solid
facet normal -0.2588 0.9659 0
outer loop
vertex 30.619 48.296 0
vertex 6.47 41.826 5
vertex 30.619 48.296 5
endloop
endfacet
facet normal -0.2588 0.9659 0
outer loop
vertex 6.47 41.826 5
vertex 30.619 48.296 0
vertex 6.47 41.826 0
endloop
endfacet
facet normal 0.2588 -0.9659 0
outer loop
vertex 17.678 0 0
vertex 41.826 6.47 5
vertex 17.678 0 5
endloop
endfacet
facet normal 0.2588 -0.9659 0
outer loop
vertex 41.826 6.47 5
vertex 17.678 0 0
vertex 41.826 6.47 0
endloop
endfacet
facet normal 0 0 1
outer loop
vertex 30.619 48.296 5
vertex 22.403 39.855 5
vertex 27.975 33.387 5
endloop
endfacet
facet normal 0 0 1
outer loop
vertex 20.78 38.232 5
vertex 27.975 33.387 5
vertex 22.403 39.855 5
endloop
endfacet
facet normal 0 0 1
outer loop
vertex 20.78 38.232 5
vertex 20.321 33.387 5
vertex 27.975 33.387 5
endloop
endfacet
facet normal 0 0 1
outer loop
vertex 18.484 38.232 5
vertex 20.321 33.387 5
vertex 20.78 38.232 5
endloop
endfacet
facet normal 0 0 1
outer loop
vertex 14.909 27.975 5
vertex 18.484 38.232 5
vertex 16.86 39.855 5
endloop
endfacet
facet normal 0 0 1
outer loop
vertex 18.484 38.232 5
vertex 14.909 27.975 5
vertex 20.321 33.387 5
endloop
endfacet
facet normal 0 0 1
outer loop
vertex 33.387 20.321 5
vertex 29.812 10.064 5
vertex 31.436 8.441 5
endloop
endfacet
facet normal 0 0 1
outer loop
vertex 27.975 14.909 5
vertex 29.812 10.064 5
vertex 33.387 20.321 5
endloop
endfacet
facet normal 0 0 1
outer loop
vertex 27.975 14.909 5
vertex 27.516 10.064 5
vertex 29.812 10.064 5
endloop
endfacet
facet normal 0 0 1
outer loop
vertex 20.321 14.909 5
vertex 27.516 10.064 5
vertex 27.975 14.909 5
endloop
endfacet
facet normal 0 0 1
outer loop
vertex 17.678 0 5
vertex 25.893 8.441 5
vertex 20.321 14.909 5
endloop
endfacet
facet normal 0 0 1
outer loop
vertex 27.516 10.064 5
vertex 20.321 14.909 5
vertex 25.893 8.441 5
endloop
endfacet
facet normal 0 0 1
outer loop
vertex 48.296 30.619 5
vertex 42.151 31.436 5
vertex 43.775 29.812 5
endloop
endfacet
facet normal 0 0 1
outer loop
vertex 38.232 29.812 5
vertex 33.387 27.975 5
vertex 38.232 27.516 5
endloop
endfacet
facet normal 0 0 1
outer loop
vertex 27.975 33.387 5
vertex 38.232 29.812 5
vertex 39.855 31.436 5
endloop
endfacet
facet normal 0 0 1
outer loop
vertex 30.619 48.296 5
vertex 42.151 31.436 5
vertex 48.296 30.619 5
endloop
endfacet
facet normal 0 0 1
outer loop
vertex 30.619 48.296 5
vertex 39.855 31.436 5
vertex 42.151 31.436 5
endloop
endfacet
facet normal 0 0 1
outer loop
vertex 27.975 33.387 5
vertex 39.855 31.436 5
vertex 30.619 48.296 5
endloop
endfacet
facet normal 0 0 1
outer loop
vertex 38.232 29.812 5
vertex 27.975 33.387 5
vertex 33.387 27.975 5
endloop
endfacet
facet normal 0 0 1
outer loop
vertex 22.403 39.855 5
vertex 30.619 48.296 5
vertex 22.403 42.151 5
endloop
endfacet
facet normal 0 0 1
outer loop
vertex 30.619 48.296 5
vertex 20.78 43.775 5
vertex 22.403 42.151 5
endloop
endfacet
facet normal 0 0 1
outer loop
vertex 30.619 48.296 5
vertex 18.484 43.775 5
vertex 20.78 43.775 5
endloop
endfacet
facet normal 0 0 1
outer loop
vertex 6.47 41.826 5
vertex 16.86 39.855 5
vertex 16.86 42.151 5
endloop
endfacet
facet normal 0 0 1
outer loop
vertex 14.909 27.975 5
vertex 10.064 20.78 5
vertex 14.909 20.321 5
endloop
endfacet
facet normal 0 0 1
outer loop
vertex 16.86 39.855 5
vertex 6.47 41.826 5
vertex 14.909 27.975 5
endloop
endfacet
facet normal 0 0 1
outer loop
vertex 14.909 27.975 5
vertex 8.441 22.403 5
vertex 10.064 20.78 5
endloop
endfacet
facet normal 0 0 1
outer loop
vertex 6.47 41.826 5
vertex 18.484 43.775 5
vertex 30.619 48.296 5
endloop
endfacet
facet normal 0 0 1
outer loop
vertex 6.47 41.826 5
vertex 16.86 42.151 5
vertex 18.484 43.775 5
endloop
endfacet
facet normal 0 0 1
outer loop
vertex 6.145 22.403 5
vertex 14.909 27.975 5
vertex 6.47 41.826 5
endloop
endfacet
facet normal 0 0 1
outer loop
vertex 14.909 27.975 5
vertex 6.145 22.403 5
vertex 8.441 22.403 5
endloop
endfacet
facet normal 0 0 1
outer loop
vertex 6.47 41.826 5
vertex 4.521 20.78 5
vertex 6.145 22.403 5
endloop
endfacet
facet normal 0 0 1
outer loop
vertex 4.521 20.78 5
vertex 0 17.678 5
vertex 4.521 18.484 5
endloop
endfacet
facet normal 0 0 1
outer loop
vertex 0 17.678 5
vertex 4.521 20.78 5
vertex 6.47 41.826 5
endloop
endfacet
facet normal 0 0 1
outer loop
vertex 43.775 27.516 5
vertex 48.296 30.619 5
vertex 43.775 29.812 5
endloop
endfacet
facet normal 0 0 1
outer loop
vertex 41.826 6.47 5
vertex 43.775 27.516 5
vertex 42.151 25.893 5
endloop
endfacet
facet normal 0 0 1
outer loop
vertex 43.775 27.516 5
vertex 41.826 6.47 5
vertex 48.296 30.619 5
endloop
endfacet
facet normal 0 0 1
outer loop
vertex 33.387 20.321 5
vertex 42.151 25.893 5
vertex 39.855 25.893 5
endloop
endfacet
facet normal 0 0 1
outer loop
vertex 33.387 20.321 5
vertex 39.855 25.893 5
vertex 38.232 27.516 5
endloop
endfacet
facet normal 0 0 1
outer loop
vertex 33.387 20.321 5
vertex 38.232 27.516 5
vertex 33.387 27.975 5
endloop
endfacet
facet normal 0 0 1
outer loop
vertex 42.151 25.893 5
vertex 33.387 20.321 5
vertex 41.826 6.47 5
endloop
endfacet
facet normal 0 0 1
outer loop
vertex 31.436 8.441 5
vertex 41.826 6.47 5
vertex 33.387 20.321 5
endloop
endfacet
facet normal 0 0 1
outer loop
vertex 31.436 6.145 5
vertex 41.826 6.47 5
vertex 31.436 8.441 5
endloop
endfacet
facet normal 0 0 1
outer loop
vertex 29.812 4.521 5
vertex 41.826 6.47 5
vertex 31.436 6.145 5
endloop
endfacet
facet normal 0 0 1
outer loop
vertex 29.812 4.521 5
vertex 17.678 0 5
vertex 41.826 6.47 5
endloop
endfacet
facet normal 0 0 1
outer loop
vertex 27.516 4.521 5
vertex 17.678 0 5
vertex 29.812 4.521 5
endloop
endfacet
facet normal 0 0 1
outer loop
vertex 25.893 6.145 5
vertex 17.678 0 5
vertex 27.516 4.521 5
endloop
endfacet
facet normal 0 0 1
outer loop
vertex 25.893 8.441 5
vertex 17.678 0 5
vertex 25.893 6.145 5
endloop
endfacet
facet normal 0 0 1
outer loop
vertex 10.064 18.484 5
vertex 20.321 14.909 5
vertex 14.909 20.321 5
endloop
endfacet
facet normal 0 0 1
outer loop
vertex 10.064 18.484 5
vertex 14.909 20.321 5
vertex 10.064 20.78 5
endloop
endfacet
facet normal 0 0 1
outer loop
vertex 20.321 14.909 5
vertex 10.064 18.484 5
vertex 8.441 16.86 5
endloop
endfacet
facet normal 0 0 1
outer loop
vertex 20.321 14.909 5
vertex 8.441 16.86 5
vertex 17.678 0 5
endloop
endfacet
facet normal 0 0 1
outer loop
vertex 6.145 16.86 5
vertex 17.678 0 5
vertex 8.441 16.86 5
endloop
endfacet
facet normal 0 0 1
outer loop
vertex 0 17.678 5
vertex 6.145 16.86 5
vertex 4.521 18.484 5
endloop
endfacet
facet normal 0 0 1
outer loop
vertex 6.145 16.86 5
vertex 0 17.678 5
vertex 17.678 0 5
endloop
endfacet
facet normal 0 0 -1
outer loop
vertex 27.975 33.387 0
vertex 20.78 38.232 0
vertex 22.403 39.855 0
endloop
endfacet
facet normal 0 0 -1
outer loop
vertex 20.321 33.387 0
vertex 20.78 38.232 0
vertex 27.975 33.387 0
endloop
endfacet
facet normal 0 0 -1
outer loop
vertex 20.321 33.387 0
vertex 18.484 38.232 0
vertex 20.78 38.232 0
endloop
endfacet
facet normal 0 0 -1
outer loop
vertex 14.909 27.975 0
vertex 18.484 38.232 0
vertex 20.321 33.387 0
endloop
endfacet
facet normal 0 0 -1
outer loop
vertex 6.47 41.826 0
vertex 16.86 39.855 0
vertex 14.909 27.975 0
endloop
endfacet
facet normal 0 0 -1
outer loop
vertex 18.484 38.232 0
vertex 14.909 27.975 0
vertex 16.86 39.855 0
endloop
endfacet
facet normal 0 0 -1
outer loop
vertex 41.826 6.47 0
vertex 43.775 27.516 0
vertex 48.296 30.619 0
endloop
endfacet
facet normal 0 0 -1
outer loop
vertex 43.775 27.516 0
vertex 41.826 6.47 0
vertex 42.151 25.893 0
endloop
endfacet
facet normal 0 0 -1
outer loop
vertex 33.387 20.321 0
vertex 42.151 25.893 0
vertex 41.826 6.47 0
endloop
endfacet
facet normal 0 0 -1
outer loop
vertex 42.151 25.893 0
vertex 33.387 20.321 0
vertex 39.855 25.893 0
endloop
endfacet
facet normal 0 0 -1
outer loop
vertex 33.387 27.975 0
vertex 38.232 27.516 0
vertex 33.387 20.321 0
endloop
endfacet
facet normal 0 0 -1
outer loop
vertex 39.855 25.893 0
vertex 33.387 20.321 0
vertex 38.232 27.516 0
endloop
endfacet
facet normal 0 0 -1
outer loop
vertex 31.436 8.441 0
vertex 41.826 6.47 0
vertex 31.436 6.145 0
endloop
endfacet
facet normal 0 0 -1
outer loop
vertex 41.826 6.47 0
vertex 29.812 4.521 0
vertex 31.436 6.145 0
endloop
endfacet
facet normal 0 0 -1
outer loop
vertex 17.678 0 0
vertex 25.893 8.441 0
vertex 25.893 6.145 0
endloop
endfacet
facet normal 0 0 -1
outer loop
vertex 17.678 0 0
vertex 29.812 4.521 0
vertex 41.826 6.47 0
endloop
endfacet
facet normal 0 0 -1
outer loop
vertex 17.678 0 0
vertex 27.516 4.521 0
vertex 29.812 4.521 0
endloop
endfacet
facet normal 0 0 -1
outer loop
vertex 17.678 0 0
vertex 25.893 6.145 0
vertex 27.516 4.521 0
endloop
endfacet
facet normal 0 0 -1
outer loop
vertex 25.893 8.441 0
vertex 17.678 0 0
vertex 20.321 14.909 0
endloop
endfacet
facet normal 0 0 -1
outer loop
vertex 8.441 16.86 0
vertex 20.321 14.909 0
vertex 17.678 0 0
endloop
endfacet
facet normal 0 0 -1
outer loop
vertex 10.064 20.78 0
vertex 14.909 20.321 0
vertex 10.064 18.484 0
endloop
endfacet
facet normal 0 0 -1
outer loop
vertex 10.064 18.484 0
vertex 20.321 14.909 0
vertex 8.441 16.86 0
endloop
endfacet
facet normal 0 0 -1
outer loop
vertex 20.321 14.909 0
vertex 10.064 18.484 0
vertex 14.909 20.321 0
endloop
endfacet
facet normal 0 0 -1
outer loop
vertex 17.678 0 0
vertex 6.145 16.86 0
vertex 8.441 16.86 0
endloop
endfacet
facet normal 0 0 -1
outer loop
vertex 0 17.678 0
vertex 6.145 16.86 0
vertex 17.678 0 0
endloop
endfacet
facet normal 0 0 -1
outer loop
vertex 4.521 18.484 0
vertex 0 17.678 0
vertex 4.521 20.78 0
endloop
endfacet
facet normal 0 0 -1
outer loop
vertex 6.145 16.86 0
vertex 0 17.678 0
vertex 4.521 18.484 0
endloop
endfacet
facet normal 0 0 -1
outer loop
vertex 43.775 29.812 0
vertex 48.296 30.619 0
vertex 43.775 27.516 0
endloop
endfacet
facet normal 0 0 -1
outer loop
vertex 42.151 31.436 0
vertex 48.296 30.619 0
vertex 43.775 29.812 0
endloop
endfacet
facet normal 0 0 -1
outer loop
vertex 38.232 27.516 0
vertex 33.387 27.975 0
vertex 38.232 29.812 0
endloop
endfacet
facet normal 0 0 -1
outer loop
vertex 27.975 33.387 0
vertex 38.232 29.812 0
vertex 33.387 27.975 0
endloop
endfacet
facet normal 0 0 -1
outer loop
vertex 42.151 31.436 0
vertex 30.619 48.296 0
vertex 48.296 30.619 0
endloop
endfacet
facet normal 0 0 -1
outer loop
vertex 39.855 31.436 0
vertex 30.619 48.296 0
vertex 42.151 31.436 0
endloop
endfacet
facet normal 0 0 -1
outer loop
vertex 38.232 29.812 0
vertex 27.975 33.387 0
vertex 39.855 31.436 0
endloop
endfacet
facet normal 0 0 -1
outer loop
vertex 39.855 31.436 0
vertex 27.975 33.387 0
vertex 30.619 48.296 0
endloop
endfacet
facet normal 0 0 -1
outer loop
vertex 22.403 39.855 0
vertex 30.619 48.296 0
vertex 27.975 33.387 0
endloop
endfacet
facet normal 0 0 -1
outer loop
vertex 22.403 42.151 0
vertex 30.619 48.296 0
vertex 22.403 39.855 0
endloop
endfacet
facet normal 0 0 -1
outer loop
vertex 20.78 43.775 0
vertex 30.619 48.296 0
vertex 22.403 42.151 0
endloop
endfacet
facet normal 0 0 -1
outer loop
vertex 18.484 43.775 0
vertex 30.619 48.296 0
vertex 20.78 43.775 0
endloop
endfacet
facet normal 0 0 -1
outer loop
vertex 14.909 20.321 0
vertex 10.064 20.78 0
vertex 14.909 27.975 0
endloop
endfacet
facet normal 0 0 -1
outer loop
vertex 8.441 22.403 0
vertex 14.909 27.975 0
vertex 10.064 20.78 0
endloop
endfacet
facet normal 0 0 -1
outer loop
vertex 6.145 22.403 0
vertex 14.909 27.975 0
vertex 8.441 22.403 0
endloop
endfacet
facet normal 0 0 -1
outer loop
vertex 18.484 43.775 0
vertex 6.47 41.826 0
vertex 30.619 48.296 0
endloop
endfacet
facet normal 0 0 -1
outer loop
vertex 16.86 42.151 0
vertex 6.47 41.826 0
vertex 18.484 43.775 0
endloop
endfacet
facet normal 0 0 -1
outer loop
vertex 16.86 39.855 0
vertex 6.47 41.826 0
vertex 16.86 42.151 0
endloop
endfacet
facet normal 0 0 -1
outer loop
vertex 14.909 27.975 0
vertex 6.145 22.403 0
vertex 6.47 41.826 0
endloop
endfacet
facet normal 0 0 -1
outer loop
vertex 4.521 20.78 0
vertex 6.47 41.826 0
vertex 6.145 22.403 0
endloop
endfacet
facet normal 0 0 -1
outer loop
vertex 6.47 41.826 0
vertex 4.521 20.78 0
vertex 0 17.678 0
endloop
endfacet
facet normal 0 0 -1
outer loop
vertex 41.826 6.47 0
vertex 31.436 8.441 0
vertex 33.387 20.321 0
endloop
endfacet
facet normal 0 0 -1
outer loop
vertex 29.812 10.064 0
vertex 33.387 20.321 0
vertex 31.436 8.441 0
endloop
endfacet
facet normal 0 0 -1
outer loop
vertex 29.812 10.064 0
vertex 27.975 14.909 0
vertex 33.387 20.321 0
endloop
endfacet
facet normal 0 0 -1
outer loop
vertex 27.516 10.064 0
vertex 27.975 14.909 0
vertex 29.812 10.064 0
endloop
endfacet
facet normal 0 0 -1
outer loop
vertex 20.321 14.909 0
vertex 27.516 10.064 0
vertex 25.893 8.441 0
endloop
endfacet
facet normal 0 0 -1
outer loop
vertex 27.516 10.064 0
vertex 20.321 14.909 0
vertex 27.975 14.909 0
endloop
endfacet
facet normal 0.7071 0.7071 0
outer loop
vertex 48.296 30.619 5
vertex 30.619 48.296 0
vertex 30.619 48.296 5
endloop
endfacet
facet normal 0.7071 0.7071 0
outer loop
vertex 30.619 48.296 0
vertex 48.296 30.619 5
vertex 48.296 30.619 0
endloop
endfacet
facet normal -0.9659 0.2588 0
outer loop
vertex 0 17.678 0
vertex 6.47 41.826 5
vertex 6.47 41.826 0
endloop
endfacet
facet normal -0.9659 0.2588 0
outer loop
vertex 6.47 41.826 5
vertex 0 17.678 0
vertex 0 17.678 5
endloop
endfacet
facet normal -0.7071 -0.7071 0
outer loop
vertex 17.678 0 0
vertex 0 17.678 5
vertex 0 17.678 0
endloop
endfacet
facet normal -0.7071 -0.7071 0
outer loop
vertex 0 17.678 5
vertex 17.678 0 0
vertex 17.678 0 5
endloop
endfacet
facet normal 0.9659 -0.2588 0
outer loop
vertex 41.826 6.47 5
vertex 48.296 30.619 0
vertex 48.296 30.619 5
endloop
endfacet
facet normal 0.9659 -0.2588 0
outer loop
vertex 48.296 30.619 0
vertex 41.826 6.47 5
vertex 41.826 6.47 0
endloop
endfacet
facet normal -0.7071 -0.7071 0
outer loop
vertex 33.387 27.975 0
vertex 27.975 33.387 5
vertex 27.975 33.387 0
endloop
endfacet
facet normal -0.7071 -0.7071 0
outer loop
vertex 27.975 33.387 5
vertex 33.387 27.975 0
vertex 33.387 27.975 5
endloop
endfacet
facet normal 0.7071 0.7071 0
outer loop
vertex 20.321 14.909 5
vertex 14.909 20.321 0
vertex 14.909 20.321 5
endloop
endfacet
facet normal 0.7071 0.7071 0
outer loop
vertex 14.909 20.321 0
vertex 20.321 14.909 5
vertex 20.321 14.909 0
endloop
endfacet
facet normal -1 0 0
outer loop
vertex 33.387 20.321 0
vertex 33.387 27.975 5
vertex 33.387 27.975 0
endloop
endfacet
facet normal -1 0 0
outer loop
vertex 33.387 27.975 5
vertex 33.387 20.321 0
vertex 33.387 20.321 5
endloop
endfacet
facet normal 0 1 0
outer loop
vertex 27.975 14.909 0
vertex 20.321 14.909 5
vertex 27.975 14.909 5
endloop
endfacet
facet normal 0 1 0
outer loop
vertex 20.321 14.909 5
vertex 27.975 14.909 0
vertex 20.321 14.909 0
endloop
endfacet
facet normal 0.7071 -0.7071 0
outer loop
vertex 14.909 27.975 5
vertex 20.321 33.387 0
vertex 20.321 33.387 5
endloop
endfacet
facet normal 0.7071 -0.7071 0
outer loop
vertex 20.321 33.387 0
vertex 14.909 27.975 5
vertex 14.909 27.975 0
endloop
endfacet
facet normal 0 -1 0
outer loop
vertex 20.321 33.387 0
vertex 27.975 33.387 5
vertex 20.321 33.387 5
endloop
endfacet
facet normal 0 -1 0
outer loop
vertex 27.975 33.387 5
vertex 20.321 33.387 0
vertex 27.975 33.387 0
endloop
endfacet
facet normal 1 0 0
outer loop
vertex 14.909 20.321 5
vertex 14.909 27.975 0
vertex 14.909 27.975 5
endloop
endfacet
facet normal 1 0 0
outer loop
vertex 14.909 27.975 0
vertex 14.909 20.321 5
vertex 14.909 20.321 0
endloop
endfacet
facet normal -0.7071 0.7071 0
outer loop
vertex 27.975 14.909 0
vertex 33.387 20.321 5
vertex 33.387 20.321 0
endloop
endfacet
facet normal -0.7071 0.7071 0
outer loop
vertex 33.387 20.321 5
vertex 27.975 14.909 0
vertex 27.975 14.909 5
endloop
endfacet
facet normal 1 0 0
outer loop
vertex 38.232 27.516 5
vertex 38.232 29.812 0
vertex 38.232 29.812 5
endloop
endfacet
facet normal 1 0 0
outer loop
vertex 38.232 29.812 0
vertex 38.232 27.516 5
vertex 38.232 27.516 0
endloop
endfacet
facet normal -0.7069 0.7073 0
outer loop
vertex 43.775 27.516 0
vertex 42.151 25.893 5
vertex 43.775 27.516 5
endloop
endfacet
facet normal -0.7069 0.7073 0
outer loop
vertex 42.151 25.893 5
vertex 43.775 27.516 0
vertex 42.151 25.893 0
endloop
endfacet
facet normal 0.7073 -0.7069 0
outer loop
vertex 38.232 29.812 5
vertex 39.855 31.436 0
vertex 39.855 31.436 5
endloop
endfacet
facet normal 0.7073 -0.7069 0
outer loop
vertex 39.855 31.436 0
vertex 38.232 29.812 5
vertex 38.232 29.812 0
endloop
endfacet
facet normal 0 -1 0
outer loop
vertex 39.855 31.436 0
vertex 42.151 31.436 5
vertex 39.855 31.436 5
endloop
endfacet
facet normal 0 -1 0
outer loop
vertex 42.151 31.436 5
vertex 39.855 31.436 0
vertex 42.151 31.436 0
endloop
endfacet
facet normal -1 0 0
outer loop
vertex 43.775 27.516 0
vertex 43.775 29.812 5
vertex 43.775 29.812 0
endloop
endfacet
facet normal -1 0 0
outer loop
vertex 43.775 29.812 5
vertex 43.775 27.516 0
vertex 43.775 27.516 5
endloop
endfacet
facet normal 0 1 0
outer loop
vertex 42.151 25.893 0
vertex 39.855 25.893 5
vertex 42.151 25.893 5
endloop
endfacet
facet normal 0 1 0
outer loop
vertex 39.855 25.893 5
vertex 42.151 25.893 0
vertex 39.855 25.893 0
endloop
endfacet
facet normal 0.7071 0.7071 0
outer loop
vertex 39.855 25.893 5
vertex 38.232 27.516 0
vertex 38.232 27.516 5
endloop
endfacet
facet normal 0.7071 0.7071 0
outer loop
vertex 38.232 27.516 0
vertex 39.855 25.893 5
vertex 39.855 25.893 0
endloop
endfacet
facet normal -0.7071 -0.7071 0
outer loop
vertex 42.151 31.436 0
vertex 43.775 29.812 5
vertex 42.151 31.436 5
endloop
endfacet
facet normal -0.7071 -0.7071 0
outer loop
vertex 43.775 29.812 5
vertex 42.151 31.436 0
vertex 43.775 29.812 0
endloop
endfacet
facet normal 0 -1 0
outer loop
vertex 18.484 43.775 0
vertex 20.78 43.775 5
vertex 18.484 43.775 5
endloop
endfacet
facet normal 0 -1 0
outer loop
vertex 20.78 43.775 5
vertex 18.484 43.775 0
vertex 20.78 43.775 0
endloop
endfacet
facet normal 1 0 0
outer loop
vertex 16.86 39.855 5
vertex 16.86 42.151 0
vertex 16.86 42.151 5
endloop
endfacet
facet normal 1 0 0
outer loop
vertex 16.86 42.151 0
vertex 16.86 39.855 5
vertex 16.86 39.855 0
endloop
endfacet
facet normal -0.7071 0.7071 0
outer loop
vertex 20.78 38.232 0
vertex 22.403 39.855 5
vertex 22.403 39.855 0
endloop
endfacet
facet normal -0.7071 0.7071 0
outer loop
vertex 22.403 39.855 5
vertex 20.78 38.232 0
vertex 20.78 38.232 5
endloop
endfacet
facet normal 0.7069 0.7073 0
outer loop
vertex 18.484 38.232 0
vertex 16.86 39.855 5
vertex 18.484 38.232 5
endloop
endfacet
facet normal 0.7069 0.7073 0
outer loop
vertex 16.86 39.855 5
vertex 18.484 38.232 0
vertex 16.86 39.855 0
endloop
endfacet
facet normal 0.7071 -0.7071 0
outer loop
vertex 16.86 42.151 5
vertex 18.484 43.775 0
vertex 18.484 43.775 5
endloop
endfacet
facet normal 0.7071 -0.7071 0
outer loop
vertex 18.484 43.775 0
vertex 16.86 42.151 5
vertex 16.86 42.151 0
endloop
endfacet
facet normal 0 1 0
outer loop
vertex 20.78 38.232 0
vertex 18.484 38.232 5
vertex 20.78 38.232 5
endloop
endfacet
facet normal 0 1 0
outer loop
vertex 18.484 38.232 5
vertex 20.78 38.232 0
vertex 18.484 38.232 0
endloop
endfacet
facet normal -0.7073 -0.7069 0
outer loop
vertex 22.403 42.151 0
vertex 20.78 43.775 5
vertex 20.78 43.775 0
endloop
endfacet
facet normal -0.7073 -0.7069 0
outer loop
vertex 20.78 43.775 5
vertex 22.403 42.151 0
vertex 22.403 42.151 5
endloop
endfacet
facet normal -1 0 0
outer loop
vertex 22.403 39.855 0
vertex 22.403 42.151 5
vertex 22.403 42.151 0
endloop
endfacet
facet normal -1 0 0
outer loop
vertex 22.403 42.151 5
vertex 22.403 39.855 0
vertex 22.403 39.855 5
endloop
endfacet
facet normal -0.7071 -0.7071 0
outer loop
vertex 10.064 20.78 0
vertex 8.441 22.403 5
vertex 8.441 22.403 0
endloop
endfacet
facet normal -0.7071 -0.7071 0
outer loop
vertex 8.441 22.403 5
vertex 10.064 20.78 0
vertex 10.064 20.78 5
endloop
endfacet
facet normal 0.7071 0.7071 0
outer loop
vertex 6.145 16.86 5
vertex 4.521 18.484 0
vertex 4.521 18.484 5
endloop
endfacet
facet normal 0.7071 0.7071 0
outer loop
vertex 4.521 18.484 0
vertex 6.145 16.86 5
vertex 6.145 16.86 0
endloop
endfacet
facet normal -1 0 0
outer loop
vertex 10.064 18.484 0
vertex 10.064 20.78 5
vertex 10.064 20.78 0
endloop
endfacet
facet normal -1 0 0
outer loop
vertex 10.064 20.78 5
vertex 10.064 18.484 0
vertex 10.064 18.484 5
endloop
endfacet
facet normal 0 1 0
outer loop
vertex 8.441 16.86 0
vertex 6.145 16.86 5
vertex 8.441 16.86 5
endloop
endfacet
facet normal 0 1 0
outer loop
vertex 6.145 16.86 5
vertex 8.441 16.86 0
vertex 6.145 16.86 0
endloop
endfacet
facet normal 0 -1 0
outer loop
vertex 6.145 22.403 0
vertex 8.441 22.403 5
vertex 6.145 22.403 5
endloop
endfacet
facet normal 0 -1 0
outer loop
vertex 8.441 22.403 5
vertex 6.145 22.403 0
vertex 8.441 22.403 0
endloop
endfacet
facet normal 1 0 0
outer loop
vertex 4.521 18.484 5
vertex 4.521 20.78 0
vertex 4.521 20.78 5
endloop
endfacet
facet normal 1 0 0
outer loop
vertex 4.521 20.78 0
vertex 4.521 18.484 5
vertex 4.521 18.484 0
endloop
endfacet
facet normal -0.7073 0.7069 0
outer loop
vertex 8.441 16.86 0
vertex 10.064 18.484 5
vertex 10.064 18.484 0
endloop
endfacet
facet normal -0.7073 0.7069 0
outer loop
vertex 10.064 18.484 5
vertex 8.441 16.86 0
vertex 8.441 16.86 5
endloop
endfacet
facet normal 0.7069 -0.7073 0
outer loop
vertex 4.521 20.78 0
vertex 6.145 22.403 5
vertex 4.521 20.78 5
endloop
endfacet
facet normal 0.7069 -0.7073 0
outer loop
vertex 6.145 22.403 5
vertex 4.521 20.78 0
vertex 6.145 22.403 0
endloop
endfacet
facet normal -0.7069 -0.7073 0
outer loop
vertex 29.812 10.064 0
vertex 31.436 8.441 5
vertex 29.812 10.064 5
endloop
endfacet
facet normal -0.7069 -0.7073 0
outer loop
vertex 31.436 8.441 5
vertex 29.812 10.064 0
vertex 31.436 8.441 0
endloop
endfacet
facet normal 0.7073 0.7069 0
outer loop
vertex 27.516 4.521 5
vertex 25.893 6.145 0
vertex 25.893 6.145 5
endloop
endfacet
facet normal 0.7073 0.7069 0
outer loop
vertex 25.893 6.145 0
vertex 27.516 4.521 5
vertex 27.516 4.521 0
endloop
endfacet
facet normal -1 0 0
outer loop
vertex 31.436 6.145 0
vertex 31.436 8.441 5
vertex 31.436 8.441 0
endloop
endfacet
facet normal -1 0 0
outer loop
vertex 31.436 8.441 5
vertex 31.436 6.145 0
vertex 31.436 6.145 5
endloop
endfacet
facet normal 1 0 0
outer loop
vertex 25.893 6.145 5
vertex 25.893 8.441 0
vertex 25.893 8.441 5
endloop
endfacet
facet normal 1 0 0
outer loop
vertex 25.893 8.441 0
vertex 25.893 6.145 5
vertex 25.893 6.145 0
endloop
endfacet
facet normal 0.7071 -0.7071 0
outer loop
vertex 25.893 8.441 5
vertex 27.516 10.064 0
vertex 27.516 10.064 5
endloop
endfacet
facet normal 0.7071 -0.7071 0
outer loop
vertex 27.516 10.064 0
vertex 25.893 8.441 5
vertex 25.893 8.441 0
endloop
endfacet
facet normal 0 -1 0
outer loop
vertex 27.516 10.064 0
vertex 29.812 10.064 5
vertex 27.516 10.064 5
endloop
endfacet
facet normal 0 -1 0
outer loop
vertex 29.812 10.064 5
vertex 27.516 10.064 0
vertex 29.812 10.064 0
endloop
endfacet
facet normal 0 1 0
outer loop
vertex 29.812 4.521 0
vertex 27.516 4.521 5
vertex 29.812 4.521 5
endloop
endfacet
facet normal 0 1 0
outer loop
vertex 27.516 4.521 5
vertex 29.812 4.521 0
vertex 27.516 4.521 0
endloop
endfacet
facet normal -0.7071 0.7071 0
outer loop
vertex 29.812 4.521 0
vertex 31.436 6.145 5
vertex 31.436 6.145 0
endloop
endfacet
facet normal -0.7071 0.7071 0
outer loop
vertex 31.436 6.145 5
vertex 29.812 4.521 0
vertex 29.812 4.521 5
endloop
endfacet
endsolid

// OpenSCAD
$fn = 32;

// ----------------------------------------------------------------------
// Polygon plate: 6-gon R25, 4 bolt windows
// ----------------------------------------------------------------------

// --- parameters (mm) ---
sides = 6;                // number of polygon sides
plate_r = 25;             // circumscribed radius of the polygon
bore_r = 10;              // centre bore radius
bolts = 4;                // number of bolt windows
ring_r = 17.45;           // bolt-circle radius
bolt_r = 3;               // bolt window radius
plate_t = 5;              // plate thickness, Z (extrusion height)

plate_d = 2 * plate_r;  // circumscribed diameter
bore_d = 2 * bore_r;  // centre bore diameter
bolt_d = 2 * bolt_r;  // bolt window diameter
ring_d = 2 * ring_r;  // bolt-circle diameter

profile = [[48.296, 30.619], [30.619, 48.296], [6.47, 41.826], [0, 17.678], [17.678, 0], [41.826, 6.47]];  // primary outline, 6 points, counter clockwise
void_1 = [[33.387, 27.975], [27.975, 33.387], [20.321, 33.387], [14.909, 27.975], [14.909, 20.321], [20.321, 14.909], [27.975, 14.909], [33.387, 20.321]];  // centre bore, 8 points
void_2 = [[43.775, 29.812], [42.151, 31.436], [39.855, 31.436], [38.232, 29.812], [38.232, 27.516], [39.855, 25.893], [42.151, 25.893], [43.775, 27.516]];  // bolt window 1, 8 points
void_3 = [[22.403, 42.151], [20.78, 43.775], [18.484, 43.775], [16.86, 42.151], [16.86, 39.855], [18.484, 38.232], [20.78, 38.232], [22.403, 39.855]];  // bolt window 2, 8 points
void_4 = [[10.064, 20.78], [8.441, 22.403], [6.145, 22.403], [4.521, 20.78], [4.521, 18.484], [6.145, 16.86], [8.441, 16.86], [10.064, 18.484]];  // bolt window 3, 8 points
void_5 = [[31.436, 8.441], [29.812, 10.064], [27.516, 10.064], [25.893, 8.441], [25.893, 6.145], [27.516, 4.521], [29.812, 4.521], [31.436, 6.145]];  // bolt window 4, 8 points

// --- the one profile operation ---
difference() {
  linear_extrude(height = plate_t) polygon(points = profile);
  translate([0, 0, -1])
    linear_extrude(height = plate_t + 2) polygon(points = void_1);
  translate([0, 0, -1])
    linear_extrude(height = plate_t + 2) polygon(points = void_2);
  translate([0, 0, -1])
    linear_extrude(height = plate_t + 2) polygon(points = void_3);
  translate([0, 0, -1])
    linear_extrude(height = plate_t + 2) polygon(points = void_4);
  translate([0, 0, -1])
    linear_extrude(height = plate_t + 2) polygon(points = void_5);
}
